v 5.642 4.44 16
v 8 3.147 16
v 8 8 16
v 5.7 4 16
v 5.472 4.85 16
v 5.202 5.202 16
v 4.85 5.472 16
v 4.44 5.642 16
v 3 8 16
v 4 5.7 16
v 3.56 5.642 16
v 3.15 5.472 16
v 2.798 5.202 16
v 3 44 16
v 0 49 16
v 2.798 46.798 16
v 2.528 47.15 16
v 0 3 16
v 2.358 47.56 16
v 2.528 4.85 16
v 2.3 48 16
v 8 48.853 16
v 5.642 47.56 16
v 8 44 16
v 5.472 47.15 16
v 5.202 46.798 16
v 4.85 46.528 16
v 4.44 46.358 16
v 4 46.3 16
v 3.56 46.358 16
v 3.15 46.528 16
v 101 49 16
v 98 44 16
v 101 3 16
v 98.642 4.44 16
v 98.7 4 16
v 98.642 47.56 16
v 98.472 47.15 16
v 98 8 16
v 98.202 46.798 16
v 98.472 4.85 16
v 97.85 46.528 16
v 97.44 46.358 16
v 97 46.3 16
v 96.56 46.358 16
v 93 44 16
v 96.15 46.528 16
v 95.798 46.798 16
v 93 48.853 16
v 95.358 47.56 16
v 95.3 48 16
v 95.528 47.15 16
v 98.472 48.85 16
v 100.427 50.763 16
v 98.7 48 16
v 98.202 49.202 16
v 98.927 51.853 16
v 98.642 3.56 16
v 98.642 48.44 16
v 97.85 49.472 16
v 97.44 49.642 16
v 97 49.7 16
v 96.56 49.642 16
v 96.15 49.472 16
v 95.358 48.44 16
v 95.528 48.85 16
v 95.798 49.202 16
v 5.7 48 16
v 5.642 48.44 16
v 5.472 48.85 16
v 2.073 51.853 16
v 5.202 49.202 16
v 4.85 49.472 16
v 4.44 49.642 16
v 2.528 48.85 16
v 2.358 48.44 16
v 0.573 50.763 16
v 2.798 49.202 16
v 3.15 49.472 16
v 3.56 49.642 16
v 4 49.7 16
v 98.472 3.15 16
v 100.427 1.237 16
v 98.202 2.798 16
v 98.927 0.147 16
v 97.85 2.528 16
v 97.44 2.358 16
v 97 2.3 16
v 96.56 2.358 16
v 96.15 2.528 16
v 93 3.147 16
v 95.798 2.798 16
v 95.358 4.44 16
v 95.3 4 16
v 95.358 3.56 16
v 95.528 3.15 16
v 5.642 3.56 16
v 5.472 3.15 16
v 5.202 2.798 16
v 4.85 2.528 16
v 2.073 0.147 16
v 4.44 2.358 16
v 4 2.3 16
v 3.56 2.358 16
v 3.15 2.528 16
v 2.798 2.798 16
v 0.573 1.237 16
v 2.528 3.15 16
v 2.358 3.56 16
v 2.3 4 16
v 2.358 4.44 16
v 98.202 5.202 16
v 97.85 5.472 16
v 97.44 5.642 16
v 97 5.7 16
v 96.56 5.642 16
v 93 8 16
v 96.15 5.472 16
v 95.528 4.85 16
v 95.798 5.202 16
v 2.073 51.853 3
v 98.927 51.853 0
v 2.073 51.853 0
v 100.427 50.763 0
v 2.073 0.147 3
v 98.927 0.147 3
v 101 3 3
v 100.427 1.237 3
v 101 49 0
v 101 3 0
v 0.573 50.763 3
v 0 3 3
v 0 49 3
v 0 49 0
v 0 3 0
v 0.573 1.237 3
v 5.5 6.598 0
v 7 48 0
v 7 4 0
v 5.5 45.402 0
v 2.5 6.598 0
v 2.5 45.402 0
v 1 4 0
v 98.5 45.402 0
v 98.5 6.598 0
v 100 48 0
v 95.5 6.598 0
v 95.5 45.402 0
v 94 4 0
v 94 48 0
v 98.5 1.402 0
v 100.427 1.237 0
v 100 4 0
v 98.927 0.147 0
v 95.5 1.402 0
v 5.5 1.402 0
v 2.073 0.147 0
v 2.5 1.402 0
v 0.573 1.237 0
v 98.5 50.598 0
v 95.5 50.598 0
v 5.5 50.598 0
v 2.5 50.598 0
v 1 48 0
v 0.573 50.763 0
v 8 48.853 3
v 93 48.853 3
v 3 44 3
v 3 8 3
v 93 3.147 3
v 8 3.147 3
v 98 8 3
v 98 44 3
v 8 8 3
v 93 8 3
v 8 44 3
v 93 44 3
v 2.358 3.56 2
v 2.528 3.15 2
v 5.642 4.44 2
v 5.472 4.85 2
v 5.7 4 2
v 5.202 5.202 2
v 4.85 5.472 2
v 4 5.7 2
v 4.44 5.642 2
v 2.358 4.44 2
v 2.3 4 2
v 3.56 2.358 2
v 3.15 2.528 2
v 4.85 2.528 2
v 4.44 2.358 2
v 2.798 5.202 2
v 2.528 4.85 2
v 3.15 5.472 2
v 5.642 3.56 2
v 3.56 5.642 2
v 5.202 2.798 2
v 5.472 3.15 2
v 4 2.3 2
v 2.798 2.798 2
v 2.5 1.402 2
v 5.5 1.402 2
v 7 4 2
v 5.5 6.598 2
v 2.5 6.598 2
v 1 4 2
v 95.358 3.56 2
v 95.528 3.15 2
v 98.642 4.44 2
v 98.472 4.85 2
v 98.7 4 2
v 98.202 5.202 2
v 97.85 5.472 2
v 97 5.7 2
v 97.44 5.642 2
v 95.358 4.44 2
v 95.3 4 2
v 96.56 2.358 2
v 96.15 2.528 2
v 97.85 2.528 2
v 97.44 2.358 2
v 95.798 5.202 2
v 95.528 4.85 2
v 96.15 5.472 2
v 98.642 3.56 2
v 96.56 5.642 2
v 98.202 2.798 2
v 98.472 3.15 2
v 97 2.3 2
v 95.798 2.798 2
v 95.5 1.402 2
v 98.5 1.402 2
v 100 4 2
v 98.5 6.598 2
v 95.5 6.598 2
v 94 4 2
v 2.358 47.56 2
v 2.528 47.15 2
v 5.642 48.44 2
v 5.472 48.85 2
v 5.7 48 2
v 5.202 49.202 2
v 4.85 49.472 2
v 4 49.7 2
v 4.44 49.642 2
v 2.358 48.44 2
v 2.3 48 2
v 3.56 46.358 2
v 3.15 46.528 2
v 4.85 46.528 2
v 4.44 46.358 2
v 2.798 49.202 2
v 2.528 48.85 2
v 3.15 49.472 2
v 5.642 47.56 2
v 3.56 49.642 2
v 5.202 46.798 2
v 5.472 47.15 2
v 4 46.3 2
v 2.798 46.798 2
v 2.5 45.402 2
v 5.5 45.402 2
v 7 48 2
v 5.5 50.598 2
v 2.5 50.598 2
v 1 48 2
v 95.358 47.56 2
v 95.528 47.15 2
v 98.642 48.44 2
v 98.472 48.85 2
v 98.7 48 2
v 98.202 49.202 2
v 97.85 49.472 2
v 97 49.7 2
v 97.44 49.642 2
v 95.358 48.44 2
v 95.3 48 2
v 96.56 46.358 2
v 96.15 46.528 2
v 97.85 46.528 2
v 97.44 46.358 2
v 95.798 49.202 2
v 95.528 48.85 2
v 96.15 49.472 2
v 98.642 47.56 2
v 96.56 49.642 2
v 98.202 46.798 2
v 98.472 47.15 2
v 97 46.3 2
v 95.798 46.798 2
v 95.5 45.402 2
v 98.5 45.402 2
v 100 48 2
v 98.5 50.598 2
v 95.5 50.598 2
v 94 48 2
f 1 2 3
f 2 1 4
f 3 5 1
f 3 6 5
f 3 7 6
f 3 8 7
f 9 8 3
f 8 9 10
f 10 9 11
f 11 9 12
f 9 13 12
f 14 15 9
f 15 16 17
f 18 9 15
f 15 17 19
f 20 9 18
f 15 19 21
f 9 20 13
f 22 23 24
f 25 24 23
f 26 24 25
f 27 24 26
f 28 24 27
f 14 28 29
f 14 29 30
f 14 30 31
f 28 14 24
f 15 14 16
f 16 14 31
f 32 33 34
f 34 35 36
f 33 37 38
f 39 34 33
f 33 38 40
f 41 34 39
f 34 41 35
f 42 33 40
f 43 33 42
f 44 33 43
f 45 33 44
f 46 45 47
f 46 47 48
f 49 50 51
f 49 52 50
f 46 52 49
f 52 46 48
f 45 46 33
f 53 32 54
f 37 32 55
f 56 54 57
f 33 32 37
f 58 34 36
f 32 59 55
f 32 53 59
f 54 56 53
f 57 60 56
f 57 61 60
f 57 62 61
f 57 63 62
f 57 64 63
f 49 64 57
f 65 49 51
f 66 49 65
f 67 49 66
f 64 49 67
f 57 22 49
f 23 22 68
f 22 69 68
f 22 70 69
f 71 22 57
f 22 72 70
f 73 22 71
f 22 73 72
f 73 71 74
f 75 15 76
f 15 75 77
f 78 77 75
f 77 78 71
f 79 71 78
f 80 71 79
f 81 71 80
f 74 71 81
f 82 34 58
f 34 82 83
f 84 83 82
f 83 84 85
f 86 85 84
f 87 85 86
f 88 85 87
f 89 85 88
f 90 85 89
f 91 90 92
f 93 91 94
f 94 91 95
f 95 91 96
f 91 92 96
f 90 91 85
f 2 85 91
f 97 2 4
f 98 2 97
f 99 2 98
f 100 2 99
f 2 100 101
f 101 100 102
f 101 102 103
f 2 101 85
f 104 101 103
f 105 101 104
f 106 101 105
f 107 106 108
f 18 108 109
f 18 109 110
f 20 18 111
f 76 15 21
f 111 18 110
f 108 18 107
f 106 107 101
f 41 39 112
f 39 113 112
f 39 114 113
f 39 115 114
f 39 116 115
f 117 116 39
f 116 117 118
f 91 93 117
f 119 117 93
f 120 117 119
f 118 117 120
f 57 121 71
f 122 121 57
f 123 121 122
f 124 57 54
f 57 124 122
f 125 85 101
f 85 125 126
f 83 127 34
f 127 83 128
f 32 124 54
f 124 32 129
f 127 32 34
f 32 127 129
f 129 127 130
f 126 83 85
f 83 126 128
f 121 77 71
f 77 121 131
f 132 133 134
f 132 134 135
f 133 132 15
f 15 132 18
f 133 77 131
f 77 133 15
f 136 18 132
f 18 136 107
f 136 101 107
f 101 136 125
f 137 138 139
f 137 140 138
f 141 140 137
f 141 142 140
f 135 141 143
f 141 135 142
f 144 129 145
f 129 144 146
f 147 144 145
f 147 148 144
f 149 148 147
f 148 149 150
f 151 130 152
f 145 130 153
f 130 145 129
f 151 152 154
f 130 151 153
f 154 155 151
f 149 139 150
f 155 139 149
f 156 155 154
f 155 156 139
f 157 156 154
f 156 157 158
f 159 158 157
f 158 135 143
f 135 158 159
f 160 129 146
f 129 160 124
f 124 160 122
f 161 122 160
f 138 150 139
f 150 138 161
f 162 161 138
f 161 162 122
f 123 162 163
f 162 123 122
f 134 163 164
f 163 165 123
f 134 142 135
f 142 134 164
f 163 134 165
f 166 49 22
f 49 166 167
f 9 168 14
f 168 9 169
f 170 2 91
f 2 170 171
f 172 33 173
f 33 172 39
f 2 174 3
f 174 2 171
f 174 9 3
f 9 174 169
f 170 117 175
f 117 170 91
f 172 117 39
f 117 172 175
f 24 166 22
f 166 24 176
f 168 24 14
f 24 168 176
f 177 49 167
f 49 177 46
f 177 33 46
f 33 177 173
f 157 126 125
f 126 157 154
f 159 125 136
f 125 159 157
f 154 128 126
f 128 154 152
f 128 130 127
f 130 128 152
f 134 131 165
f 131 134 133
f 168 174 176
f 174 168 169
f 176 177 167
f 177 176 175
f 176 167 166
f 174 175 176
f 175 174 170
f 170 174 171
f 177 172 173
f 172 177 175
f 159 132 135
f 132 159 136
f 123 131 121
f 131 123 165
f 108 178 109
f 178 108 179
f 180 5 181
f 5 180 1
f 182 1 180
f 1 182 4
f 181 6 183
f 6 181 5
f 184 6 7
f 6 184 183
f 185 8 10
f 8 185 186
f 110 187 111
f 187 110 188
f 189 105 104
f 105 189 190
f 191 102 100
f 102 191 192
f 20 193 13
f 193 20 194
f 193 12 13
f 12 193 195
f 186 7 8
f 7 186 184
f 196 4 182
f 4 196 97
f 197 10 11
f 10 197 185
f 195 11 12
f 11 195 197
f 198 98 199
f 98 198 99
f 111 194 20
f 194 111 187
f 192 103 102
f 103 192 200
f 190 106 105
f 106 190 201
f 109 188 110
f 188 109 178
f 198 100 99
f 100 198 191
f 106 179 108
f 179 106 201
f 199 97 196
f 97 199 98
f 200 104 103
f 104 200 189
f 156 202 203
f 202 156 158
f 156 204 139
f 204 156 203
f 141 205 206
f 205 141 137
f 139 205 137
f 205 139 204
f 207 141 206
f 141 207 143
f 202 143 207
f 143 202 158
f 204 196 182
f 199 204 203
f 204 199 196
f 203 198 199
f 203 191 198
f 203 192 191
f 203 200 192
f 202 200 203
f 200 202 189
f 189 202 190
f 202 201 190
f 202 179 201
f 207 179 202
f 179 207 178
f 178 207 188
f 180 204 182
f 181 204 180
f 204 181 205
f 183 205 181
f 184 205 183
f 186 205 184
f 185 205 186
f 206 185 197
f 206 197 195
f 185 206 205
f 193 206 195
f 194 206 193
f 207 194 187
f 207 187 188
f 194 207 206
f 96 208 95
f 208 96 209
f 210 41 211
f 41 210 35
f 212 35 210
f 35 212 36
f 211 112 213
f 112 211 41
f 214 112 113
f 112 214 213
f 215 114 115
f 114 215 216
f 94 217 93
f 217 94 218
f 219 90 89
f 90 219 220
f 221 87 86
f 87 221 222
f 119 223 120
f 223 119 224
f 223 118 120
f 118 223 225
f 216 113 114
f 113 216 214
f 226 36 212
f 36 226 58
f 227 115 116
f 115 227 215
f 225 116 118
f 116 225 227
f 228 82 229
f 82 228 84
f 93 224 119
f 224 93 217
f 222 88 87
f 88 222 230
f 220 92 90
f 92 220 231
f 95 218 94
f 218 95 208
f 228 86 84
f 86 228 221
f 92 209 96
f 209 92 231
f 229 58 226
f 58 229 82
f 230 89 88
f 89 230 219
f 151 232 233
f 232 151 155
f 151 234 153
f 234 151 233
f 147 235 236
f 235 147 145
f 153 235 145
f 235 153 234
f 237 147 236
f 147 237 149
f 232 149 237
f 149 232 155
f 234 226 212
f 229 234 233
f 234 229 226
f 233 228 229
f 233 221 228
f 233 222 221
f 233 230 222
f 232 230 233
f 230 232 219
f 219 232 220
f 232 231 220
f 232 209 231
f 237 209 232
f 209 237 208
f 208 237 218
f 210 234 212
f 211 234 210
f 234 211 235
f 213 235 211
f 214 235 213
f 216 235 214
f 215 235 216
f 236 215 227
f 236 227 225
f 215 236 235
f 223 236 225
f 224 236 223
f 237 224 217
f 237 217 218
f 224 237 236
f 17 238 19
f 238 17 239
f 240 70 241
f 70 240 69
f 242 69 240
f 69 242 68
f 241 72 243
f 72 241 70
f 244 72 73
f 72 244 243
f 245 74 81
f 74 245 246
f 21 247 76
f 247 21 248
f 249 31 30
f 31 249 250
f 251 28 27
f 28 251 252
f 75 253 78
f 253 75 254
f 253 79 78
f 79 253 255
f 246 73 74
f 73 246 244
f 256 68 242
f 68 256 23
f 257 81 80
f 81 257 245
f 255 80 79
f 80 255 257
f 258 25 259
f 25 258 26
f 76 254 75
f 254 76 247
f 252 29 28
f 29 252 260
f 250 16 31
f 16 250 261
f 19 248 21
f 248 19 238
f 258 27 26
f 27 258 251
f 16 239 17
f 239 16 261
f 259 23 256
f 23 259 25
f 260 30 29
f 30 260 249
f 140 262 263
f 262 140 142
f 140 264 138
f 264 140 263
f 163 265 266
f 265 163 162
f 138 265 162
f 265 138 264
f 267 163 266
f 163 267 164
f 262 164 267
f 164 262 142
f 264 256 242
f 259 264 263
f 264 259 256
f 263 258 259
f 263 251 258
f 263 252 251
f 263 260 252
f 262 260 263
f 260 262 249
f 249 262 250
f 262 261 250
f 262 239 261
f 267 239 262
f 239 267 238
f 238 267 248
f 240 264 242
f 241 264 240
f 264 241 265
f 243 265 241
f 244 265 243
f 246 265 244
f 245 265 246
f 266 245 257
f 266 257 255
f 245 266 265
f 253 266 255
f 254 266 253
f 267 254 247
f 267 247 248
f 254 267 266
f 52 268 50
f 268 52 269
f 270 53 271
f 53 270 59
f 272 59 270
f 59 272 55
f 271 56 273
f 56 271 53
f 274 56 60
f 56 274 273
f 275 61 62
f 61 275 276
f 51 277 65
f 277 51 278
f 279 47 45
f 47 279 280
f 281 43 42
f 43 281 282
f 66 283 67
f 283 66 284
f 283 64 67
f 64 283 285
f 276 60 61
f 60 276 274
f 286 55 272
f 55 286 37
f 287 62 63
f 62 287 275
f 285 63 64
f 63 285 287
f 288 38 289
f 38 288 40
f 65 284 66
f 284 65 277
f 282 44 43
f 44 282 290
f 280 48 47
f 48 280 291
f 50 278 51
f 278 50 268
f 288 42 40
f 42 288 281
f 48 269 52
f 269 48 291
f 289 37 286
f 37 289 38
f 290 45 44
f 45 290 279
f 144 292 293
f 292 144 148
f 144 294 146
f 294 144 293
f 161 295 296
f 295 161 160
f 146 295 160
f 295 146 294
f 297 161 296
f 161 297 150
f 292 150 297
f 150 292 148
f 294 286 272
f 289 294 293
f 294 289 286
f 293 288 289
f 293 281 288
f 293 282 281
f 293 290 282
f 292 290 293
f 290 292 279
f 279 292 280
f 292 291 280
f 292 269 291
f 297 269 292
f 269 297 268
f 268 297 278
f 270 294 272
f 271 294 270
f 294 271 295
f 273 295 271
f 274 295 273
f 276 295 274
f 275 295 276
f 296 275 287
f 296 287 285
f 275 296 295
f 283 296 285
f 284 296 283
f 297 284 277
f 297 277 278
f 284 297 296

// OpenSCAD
// Box for microusb power breakout.

// Copyright (C) 2016 Embecosm Limited (www.embecosm.com)

// Contributor: Jeremy Bennett <jeremy.bennett@embecosm.com>

// This file is licensed under the Creative Commons Attribution-ShareAlike 3.0
// Unported License. To view a copy of this license, visit
// http://creativecommons.org/licenses/by-sa/3.0/ or send a letter to Creative
// Commons, PO Box 1866, Mountain View, CA 94042, USA.


// A container for a circuit board containing microusb power breakout.


PILLAR = 8;
WALL = 3;
PCB_X = 85 + (PILLAR - WALL) * 2;
PCB_Y = 46;
BASE_H = 13;
DELTA = 0.01;

module round_cube (x, y, z) {
    hull () {
        translate (v = [-x/2 + 3, -y/2 + 3, 0])
            cylinder (r = 3, h = z, center = true);
        translate (v = [ x/2 - 3, -y/2 + 3, 0])
            cylinder (r = 3, h = z, center = true);
        translate (v = [-x/2 + 3,  y/2 - 3, 0])
            cylinder (r = 3, h = z, center = true);
        translate (v = [ x/2 - 3,  y/2 - 3, 0])
            cylinder (r = 3, h = z, center = true);
	}
}

module sides () {
    translate (v = [PCB_X / 2 + WALL, PCB_Y / 2 + WALL, (BASE_H + WALL) / 2])
        difference () {
            round_cube (PCB_X + WALL * 2, PCB_Y + WALL * 2, BASE_H + WALL);
            round_cube (PCB_X, PCB_Y, BASE_H + WALL + DELTA);
        }
}

module base () {
    translate (v = [PCB_X / 2 + WALL, PCB_Y / 2 + WALL, WALL / 2])
        round_cube (PCB_X + WALL * 2, PCB_Y + WALL * 2, WALL);
}


module pillars () {
    translate (v = [WALL, WALL, WALL - DELTA])
        cube (size = [PILLAR - WALL, PILLAR - WALL, BASE_H + DELTA],
              center = false);
    translate (v = [WALL * 2 + PCB_X - PILLAR, WALL, WALL - DELTA])
        cube (size = [PILLAR - WALL, PILLAR - WALL, BASE_H + DELTA],
              center = false);
    translate (v = [WALL, WALL * 2 + PCB_Y - PILLAR, WALL - DELTA])
        cube (size = [PILLAR - WALL, PILLAR - WALL, BASE_H + DELTA],
              center = false);
    translate (v = [WALL * 2 + PCB_X - PILLAR,
                    WALL * 2 + PCB_Y - PILLAR, WALL - DELTA])
        cube (size = [PILLAR - WALL, PILLAR - WALL, BASE_H + DELTA],
              center = false);
}

module hole () {
    union () {
        cylinder (h = WALL + BASE_H + DELTA * 2, r = 1.7, $fn = 24,
                  center = false);
        cylinder (h = 2 + DELTA, r = 3, $fn = 6, center = false);
    }
}

module holes () {
    union () {
        translate (v = [PILLAR / 2, PILLAR / 2, -DELTA])
            hole ();
        translate (v = [WALL * 2 + PCB_X - PILLAR / 2, PILLAR / 2, -DELTA])
            hole ();
        translate (v = [PILLAR / 2, WALL * 2 + PCB_Y - PILLAR / 2, -DELTA])
            hole ();
        translate (v = [WALL * 2 + PCB_X - PILLAR / 2,
                        WALL * 2+ PCB_Y - PILLAR / 2, -DELTA])
            hole ();
    }
}

module power_box_base () {
    union () {
        sides ();
        base ();
        pillars ();
    }
}

module power_box () {
    difference () {
        power_box_base ();
        holes ();
    }
}

power_box ();
